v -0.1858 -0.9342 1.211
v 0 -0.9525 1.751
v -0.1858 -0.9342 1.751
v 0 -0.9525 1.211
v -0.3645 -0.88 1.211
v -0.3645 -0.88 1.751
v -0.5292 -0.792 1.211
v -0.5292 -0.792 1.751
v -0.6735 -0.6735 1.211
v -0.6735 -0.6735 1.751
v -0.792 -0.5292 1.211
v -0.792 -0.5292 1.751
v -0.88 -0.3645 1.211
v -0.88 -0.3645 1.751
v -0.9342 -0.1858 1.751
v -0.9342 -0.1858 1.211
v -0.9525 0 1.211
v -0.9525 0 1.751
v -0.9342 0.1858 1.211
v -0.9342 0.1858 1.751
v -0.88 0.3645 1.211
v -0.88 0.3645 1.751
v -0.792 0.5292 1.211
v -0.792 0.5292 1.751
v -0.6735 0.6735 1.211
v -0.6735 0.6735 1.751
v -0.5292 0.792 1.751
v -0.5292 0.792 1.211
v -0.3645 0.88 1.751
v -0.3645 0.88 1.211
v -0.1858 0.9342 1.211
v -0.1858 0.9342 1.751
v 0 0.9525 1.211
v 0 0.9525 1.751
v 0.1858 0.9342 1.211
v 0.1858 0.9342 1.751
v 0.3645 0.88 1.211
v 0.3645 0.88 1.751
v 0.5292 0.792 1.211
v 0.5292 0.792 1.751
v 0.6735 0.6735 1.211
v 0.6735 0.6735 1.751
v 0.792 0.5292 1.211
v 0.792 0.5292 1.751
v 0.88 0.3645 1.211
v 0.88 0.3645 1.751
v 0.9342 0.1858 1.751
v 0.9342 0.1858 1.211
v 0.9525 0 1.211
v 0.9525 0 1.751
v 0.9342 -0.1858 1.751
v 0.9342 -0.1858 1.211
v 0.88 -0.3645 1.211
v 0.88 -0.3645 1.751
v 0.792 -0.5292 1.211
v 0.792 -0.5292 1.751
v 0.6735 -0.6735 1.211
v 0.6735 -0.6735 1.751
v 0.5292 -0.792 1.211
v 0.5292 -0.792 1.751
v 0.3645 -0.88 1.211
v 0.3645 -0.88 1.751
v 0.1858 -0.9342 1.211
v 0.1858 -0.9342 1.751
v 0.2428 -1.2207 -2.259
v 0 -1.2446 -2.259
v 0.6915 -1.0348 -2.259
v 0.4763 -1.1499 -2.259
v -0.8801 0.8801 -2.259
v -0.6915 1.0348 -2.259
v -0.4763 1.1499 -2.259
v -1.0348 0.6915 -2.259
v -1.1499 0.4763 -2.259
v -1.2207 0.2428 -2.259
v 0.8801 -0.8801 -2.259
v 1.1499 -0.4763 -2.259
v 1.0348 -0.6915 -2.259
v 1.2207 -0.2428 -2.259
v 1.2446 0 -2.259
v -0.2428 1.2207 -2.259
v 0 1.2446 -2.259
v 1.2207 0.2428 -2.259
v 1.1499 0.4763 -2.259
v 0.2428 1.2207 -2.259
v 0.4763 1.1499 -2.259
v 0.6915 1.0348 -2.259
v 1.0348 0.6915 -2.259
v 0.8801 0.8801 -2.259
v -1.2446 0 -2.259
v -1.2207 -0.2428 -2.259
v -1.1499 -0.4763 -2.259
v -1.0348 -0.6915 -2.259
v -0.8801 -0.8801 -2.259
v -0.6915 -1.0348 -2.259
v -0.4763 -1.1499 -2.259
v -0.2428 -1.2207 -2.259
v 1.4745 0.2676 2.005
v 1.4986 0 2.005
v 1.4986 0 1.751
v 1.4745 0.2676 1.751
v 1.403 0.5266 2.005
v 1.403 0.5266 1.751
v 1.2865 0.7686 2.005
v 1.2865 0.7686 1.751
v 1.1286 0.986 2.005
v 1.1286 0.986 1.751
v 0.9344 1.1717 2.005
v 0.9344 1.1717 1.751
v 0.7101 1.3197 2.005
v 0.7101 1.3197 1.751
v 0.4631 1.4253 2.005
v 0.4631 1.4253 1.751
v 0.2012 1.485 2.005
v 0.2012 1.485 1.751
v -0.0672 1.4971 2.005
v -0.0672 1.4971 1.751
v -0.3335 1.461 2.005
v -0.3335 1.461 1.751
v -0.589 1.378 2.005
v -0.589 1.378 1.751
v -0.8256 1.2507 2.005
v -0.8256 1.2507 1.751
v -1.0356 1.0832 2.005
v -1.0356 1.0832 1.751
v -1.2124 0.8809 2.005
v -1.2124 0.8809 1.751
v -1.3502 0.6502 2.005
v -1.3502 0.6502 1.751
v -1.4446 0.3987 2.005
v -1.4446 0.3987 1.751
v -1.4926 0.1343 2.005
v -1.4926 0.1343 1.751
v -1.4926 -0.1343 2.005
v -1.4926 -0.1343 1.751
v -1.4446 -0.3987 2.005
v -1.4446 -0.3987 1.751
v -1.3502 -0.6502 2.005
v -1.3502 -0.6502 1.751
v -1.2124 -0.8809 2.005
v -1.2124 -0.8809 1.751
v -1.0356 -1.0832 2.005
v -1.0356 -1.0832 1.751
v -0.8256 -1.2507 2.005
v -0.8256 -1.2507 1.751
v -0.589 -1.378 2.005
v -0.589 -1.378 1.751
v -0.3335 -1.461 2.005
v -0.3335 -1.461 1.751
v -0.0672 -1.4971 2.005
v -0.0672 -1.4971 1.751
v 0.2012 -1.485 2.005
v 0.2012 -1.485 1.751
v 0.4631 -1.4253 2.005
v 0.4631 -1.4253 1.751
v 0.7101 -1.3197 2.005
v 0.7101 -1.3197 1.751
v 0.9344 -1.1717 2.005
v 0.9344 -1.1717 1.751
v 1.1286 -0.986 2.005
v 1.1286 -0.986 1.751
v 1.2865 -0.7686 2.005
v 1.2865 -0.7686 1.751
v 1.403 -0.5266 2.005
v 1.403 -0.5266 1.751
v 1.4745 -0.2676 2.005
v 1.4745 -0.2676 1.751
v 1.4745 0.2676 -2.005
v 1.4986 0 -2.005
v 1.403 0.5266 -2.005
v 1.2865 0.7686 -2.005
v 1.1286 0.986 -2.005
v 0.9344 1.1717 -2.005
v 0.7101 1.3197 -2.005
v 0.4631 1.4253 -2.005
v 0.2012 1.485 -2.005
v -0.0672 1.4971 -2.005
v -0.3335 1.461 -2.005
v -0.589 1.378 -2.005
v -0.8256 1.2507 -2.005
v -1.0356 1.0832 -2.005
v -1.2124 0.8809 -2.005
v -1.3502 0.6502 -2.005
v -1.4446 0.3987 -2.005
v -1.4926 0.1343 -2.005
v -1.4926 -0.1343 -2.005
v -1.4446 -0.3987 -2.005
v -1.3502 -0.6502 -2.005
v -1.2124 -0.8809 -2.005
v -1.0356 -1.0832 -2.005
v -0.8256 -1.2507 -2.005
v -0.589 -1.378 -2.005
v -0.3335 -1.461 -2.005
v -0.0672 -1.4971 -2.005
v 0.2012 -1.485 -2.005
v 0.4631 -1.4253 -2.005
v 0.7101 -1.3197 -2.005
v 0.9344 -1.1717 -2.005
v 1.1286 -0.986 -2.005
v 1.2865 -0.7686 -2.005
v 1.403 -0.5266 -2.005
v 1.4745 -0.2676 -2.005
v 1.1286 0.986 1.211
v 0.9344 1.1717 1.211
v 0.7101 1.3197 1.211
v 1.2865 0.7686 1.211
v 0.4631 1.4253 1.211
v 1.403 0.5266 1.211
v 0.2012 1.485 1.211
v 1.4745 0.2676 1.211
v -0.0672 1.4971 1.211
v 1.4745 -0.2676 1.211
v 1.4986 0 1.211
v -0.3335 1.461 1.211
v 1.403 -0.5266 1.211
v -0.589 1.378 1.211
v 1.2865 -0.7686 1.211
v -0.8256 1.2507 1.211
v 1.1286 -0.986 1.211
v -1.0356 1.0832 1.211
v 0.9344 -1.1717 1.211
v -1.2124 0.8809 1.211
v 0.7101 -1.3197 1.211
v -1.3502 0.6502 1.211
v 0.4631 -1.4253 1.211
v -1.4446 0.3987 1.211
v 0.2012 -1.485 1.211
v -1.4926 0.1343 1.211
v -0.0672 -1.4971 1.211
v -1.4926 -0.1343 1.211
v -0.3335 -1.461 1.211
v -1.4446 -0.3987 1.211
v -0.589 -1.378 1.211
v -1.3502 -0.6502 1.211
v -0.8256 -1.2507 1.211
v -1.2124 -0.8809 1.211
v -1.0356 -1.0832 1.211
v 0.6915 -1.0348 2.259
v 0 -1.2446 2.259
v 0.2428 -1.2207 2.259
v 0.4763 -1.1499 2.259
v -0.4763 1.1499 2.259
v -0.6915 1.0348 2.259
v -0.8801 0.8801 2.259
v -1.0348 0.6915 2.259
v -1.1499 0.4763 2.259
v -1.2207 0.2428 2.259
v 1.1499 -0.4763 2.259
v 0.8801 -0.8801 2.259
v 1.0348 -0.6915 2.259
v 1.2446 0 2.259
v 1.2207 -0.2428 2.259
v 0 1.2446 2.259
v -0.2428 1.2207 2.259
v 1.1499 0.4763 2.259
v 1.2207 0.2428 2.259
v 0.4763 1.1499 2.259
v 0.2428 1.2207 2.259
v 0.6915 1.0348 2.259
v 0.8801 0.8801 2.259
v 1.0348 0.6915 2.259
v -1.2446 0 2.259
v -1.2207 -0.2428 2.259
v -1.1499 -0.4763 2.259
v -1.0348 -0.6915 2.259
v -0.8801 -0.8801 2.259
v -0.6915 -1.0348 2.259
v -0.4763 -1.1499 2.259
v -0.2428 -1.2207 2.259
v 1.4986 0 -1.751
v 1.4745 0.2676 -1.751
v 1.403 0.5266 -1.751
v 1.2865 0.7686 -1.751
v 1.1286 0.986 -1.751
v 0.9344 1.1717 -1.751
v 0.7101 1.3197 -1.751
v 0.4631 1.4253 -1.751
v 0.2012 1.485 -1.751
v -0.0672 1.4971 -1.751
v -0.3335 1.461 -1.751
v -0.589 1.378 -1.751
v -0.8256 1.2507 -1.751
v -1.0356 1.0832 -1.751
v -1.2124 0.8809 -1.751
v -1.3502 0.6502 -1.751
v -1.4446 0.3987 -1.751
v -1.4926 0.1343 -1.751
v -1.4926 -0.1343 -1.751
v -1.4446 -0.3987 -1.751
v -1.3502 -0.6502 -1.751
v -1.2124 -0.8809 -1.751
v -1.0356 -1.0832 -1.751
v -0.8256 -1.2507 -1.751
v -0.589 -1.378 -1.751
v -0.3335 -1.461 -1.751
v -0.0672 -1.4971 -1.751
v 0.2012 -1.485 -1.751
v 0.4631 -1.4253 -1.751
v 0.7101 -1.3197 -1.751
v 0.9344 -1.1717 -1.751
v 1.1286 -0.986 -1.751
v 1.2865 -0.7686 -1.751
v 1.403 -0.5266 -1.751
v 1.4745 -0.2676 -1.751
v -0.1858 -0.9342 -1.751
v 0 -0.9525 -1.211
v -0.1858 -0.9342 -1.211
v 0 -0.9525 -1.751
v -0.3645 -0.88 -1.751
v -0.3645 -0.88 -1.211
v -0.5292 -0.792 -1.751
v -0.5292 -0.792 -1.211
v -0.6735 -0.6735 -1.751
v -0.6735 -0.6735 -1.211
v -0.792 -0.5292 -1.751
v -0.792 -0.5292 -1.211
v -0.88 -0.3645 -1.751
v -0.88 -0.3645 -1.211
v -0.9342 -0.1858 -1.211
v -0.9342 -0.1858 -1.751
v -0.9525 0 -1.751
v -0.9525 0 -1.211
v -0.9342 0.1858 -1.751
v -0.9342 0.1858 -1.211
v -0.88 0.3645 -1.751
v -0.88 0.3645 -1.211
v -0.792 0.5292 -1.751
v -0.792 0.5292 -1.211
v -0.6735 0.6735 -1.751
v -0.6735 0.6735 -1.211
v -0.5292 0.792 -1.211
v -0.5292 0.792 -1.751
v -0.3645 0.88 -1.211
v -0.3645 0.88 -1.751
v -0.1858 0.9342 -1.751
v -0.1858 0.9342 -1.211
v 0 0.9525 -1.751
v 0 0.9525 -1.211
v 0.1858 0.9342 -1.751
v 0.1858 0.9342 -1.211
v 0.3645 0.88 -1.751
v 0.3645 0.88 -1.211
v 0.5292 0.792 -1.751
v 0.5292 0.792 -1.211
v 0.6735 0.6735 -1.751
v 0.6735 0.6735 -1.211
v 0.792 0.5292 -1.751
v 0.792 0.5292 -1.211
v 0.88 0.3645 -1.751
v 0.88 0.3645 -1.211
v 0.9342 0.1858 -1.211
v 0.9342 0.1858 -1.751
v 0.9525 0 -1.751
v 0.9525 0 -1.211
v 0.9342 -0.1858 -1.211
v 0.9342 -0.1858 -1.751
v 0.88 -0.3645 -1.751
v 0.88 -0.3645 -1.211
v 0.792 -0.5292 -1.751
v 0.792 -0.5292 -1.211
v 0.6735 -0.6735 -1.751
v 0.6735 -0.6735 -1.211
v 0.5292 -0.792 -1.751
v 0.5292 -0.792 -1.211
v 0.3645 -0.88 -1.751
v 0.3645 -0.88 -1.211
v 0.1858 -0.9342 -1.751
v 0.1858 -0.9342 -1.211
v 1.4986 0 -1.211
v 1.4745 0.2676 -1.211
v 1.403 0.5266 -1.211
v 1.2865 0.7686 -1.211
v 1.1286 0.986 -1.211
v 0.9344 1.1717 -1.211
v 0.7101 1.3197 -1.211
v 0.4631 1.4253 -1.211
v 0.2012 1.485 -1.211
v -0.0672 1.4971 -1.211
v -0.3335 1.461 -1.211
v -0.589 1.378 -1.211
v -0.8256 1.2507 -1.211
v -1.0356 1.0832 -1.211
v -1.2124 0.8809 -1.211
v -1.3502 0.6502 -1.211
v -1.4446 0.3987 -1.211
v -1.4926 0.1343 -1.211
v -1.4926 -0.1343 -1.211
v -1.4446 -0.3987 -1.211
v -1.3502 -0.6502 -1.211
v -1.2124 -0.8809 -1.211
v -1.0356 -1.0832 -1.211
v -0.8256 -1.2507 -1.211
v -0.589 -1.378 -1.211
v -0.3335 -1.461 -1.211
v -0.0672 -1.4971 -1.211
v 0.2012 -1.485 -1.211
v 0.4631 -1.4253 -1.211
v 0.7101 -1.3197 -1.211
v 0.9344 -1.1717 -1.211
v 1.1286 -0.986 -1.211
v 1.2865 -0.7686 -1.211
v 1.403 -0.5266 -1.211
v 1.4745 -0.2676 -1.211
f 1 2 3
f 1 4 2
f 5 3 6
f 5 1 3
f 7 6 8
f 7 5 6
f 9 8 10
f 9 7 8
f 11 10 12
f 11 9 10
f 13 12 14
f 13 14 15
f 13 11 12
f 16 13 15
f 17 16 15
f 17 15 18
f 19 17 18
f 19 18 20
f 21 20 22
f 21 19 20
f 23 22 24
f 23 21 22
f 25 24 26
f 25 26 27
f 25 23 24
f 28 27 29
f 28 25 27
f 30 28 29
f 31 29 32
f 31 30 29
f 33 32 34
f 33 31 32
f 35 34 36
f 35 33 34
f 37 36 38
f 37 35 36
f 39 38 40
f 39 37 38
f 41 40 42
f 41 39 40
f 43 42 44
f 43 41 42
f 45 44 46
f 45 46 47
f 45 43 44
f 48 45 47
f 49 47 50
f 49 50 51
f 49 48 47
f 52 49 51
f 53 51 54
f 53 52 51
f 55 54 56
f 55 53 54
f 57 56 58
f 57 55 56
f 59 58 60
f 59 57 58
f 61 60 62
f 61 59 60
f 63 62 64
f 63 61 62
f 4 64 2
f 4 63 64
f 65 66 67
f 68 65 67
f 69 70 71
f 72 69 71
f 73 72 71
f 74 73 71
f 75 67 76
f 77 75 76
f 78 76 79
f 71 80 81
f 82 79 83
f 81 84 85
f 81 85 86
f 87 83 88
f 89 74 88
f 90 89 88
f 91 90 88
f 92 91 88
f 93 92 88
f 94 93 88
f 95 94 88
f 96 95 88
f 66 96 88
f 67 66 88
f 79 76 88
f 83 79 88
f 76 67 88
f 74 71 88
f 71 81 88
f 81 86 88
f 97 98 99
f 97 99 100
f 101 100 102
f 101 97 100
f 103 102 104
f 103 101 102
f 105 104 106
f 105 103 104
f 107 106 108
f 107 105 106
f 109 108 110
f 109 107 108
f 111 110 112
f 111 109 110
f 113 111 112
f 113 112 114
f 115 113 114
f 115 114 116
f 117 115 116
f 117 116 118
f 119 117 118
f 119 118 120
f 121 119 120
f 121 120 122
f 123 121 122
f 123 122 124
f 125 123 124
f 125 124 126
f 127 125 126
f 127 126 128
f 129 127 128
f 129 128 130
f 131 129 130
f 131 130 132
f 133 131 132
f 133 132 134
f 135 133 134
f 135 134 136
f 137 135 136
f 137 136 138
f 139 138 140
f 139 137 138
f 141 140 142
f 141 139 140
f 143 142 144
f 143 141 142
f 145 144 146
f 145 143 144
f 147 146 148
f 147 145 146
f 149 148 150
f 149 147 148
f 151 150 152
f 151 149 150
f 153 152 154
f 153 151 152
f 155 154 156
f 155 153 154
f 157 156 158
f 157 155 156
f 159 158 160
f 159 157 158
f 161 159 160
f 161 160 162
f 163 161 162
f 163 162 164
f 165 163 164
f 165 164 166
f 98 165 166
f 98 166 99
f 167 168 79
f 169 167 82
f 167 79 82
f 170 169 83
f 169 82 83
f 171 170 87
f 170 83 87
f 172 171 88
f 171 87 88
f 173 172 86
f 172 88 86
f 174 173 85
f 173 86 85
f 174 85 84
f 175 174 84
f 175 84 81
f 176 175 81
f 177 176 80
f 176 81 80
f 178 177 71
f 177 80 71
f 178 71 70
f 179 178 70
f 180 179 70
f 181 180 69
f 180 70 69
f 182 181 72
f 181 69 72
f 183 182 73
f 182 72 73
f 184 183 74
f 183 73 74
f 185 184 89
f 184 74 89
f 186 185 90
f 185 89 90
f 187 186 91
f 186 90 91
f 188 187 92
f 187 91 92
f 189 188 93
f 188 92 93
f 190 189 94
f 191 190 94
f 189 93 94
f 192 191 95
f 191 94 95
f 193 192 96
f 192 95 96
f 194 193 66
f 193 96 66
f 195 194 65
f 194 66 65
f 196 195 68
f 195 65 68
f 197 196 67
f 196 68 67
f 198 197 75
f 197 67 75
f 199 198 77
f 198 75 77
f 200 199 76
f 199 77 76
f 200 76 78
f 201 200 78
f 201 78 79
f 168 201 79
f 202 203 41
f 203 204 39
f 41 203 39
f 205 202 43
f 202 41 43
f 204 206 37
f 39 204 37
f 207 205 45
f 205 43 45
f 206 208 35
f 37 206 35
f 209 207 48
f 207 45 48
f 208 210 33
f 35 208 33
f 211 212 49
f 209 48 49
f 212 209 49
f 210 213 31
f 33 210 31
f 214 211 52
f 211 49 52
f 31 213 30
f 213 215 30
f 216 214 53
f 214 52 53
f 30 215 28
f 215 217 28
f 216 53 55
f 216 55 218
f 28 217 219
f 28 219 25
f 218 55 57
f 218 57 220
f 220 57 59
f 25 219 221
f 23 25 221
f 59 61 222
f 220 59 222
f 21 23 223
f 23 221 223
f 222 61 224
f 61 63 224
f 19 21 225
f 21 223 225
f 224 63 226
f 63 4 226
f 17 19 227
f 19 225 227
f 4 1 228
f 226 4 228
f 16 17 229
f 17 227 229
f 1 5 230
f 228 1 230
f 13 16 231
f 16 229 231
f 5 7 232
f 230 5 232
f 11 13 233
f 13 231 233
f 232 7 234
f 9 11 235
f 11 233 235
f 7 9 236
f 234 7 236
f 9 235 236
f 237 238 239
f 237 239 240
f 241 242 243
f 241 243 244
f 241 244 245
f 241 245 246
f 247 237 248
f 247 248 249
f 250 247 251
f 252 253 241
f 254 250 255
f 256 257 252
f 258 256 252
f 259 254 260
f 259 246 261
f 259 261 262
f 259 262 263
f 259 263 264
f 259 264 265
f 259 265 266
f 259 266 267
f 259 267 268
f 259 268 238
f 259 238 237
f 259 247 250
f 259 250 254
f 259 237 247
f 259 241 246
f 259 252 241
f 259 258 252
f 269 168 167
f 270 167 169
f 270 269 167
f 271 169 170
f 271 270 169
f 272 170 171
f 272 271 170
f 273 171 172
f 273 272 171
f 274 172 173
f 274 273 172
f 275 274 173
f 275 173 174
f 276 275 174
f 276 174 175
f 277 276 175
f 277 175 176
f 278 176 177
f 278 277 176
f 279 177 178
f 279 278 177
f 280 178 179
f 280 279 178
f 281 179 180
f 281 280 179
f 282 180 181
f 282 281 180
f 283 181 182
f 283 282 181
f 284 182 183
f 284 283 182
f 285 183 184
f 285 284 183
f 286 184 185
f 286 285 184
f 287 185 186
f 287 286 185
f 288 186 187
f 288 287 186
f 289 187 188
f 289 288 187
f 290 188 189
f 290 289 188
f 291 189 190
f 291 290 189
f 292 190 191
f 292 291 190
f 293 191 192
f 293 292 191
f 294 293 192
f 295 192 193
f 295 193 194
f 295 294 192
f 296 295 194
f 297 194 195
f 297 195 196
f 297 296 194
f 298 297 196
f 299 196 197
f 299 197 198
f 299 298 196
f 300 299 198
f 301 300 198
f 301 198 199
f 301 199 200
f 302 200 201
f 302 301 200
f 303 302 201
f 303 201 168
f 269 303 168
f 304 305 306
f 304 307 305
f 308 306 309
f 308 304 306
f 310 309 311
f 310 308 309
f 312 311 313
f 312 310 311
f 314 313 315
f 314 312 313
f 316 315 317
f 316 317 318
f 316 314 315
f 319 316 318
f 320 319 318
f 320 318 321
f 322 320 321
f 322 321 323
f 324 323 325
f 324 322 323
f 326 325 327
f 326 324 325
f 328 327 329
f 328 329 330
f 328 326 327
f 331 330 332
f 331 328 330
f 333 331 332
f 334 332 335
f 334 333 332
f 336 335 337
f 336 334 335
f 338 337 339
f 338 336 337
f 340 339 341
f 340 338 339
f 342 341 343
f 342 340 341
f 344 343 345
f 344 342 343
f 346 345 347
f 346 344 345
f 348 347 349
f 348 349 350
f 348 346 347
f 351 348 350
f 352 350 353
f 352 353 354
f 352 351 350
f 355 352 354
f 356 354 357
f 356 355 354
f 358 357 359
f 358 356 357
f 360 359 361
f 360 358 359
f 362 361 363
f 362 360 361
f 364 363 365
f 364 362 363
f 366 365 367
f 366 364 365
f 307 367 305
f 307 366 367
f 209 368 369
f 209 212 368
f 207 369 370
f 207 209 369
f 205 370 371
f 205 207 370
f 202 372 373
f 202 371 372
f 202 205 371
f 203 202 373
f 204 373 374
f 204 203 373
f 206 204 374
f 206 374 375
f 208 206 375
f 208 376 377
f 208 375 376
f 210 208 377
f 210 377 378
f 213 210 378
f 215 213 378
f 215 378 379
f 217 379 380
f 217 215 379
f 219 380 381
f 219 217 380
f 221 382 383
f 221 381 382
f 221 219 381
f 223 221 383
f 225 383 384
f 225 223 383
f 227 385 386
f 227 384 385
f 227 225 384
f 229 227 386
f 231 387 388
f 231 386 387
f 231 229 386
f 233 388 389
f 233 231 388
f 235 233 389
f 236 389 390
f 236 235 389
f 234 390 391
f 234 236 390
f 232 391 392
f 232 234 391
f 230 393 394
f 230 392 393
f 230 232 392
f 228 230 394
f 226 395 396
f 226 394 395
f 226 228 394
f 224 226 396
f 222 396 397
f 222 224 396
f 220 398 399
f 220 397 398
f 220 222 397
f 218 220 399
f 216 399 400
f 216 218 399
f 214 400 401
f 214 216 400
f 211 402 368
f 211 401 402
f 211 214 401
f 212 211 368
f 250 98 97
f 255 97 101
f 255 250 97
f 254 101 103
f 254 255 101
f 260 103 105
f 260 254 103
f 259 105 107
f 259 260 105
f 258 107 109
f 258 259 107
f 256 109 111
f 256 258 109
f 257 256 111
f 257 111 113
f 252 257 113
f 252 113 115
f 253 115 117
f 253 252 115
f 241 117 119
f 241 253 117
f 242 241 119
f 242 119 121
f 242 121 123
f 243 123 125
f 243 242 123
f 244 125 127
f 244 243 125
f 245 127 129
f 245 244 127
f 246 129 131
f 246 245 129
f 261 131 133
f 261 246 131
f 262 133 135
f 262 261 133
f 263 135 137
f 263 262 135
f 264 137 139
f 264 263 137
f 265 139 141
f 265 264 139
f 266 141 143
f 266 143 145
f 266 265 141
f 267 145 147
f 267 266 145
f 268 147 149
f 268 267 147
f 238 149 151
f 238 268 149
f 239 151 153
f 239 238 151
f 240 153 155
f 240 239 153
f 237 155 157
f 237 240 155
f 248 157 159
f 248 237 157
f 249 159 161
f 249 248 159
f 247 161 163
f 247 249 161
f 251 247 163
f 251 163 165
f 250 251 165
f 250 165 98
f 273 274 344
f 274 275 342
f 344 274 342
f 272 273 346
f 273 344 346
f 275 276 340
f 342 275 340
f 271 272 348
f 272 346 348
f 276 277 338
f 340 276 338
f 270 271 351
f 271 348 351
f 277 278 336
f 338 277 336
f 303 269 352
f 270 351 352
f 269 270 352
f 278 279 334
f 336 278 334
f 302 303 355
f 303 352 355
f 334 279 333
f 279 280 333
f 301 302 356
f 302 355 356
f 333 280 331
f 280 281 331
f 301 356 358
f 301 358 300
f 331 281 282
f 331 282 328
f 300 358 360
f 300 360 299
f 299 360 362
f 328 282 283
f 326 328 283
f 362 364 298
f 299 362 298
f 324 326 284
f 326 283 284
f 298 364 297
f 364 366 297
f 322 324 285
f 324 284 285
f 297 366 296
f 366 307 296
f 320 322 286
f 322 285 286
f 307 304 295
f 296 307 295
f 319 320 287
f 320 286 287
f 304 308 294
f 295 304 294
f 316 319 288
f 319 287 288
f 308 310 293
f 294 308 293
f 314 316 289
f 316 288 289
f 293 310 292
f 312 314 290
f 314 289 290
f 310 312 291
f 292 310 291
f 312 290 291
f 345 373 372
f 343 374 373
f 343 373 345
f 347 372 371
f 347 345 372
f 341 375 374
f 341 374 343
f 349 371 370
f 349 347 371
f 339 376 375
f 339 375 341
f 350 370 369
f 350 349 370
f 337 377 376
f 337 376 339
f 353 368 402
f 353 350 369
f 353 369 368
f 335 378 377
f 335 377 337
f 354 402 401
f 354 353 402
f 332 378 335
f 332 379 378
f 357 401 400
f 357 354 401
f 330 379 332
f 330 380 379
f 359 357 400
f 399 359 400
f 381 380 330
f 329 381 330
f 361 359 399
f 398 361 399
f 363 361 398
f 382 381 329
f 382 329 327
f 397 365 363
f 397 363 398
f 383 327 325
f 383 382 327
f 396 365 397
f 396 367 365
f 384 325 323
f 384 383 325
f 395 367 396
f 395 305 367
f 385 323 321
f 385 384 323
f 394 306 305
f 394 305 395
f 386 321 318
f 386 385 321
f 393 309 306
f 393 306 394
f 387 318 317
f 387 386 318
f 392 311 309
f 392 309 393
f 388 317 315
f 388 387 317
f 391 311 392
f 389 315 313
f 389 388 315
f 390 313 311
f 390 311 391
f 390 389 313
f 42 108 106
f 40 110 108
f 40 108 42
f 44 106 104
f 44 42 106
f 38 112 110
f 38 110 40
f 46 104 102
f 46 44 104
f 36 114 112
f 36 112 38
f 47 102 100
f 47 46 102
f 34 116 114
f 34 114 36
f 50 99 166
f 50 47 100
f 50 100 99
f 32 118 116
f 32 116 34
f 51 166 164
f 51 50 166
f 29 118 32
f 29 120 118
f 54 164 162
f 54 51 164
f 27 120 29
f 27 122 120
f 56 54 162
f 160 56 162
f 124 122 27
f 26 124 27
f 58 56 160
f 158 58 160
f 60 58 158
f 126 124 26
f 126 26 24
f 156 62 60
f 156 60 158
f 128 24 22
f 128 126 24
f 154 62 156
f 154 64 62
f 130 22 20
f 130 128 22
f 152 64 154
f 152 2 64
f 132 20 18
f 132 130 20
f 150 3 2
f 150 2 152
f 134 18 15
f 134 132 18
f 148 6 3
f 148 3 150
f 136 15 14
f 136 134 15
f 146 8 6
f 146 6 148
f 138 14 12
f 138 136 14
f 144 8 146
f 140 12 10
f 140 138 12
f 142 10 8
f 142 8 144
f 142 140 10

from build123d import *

# Parameters (mm, degrees)
SKETCH1_R           = 1.4986
BOSS_EXTRUDE1_DEPTH = 2.2590125
SKETCH2_W           = 0.540004
SKETCH2_H           = 0.5461
CHAMFER1_SIZE       = 0.254


with BuildPart() as part:
    # Sketch1 → Boss-Extrude1 (new body, symmetric)
    with BuildSketch(Plane.XY):
        Circle(SKETCH1_R)
    extrude(amount=BOSS_EXTRUDE1_DEPTH, both=True)

    # Sketch2 → Cut-Revolve1 (revolve, cut)
    with BuildSketch(Plane(origin=(0, 0, 0), x_dir=(0, 0, -1), z_dir=(1, 0, 0))):
        with Locations((-1.4810105, -1.22555)):
            Rectangle(SKETCH2_W, SKETCH2_H)
        with Locations((1.4810105, -1.22555)):
            Rectangle(SKETCH2_W, SKETCH2_H)
    revolve(axis=Axis((0, 0, 8.828032455), (0, 0, -1)), mode=Mode.SUBTRACT)

    # Chamfer1
    chamfer1_edges = [part.edges().sort_by_distance(p)[0] for p in [
        (-1.4986, 0, -2.2590125),
        (-1.4986, 0, 2.2590125),
    ]]
    chamfer(chamfer1_edges, length=CHAMFER1_SIZE)


solid = part.part
